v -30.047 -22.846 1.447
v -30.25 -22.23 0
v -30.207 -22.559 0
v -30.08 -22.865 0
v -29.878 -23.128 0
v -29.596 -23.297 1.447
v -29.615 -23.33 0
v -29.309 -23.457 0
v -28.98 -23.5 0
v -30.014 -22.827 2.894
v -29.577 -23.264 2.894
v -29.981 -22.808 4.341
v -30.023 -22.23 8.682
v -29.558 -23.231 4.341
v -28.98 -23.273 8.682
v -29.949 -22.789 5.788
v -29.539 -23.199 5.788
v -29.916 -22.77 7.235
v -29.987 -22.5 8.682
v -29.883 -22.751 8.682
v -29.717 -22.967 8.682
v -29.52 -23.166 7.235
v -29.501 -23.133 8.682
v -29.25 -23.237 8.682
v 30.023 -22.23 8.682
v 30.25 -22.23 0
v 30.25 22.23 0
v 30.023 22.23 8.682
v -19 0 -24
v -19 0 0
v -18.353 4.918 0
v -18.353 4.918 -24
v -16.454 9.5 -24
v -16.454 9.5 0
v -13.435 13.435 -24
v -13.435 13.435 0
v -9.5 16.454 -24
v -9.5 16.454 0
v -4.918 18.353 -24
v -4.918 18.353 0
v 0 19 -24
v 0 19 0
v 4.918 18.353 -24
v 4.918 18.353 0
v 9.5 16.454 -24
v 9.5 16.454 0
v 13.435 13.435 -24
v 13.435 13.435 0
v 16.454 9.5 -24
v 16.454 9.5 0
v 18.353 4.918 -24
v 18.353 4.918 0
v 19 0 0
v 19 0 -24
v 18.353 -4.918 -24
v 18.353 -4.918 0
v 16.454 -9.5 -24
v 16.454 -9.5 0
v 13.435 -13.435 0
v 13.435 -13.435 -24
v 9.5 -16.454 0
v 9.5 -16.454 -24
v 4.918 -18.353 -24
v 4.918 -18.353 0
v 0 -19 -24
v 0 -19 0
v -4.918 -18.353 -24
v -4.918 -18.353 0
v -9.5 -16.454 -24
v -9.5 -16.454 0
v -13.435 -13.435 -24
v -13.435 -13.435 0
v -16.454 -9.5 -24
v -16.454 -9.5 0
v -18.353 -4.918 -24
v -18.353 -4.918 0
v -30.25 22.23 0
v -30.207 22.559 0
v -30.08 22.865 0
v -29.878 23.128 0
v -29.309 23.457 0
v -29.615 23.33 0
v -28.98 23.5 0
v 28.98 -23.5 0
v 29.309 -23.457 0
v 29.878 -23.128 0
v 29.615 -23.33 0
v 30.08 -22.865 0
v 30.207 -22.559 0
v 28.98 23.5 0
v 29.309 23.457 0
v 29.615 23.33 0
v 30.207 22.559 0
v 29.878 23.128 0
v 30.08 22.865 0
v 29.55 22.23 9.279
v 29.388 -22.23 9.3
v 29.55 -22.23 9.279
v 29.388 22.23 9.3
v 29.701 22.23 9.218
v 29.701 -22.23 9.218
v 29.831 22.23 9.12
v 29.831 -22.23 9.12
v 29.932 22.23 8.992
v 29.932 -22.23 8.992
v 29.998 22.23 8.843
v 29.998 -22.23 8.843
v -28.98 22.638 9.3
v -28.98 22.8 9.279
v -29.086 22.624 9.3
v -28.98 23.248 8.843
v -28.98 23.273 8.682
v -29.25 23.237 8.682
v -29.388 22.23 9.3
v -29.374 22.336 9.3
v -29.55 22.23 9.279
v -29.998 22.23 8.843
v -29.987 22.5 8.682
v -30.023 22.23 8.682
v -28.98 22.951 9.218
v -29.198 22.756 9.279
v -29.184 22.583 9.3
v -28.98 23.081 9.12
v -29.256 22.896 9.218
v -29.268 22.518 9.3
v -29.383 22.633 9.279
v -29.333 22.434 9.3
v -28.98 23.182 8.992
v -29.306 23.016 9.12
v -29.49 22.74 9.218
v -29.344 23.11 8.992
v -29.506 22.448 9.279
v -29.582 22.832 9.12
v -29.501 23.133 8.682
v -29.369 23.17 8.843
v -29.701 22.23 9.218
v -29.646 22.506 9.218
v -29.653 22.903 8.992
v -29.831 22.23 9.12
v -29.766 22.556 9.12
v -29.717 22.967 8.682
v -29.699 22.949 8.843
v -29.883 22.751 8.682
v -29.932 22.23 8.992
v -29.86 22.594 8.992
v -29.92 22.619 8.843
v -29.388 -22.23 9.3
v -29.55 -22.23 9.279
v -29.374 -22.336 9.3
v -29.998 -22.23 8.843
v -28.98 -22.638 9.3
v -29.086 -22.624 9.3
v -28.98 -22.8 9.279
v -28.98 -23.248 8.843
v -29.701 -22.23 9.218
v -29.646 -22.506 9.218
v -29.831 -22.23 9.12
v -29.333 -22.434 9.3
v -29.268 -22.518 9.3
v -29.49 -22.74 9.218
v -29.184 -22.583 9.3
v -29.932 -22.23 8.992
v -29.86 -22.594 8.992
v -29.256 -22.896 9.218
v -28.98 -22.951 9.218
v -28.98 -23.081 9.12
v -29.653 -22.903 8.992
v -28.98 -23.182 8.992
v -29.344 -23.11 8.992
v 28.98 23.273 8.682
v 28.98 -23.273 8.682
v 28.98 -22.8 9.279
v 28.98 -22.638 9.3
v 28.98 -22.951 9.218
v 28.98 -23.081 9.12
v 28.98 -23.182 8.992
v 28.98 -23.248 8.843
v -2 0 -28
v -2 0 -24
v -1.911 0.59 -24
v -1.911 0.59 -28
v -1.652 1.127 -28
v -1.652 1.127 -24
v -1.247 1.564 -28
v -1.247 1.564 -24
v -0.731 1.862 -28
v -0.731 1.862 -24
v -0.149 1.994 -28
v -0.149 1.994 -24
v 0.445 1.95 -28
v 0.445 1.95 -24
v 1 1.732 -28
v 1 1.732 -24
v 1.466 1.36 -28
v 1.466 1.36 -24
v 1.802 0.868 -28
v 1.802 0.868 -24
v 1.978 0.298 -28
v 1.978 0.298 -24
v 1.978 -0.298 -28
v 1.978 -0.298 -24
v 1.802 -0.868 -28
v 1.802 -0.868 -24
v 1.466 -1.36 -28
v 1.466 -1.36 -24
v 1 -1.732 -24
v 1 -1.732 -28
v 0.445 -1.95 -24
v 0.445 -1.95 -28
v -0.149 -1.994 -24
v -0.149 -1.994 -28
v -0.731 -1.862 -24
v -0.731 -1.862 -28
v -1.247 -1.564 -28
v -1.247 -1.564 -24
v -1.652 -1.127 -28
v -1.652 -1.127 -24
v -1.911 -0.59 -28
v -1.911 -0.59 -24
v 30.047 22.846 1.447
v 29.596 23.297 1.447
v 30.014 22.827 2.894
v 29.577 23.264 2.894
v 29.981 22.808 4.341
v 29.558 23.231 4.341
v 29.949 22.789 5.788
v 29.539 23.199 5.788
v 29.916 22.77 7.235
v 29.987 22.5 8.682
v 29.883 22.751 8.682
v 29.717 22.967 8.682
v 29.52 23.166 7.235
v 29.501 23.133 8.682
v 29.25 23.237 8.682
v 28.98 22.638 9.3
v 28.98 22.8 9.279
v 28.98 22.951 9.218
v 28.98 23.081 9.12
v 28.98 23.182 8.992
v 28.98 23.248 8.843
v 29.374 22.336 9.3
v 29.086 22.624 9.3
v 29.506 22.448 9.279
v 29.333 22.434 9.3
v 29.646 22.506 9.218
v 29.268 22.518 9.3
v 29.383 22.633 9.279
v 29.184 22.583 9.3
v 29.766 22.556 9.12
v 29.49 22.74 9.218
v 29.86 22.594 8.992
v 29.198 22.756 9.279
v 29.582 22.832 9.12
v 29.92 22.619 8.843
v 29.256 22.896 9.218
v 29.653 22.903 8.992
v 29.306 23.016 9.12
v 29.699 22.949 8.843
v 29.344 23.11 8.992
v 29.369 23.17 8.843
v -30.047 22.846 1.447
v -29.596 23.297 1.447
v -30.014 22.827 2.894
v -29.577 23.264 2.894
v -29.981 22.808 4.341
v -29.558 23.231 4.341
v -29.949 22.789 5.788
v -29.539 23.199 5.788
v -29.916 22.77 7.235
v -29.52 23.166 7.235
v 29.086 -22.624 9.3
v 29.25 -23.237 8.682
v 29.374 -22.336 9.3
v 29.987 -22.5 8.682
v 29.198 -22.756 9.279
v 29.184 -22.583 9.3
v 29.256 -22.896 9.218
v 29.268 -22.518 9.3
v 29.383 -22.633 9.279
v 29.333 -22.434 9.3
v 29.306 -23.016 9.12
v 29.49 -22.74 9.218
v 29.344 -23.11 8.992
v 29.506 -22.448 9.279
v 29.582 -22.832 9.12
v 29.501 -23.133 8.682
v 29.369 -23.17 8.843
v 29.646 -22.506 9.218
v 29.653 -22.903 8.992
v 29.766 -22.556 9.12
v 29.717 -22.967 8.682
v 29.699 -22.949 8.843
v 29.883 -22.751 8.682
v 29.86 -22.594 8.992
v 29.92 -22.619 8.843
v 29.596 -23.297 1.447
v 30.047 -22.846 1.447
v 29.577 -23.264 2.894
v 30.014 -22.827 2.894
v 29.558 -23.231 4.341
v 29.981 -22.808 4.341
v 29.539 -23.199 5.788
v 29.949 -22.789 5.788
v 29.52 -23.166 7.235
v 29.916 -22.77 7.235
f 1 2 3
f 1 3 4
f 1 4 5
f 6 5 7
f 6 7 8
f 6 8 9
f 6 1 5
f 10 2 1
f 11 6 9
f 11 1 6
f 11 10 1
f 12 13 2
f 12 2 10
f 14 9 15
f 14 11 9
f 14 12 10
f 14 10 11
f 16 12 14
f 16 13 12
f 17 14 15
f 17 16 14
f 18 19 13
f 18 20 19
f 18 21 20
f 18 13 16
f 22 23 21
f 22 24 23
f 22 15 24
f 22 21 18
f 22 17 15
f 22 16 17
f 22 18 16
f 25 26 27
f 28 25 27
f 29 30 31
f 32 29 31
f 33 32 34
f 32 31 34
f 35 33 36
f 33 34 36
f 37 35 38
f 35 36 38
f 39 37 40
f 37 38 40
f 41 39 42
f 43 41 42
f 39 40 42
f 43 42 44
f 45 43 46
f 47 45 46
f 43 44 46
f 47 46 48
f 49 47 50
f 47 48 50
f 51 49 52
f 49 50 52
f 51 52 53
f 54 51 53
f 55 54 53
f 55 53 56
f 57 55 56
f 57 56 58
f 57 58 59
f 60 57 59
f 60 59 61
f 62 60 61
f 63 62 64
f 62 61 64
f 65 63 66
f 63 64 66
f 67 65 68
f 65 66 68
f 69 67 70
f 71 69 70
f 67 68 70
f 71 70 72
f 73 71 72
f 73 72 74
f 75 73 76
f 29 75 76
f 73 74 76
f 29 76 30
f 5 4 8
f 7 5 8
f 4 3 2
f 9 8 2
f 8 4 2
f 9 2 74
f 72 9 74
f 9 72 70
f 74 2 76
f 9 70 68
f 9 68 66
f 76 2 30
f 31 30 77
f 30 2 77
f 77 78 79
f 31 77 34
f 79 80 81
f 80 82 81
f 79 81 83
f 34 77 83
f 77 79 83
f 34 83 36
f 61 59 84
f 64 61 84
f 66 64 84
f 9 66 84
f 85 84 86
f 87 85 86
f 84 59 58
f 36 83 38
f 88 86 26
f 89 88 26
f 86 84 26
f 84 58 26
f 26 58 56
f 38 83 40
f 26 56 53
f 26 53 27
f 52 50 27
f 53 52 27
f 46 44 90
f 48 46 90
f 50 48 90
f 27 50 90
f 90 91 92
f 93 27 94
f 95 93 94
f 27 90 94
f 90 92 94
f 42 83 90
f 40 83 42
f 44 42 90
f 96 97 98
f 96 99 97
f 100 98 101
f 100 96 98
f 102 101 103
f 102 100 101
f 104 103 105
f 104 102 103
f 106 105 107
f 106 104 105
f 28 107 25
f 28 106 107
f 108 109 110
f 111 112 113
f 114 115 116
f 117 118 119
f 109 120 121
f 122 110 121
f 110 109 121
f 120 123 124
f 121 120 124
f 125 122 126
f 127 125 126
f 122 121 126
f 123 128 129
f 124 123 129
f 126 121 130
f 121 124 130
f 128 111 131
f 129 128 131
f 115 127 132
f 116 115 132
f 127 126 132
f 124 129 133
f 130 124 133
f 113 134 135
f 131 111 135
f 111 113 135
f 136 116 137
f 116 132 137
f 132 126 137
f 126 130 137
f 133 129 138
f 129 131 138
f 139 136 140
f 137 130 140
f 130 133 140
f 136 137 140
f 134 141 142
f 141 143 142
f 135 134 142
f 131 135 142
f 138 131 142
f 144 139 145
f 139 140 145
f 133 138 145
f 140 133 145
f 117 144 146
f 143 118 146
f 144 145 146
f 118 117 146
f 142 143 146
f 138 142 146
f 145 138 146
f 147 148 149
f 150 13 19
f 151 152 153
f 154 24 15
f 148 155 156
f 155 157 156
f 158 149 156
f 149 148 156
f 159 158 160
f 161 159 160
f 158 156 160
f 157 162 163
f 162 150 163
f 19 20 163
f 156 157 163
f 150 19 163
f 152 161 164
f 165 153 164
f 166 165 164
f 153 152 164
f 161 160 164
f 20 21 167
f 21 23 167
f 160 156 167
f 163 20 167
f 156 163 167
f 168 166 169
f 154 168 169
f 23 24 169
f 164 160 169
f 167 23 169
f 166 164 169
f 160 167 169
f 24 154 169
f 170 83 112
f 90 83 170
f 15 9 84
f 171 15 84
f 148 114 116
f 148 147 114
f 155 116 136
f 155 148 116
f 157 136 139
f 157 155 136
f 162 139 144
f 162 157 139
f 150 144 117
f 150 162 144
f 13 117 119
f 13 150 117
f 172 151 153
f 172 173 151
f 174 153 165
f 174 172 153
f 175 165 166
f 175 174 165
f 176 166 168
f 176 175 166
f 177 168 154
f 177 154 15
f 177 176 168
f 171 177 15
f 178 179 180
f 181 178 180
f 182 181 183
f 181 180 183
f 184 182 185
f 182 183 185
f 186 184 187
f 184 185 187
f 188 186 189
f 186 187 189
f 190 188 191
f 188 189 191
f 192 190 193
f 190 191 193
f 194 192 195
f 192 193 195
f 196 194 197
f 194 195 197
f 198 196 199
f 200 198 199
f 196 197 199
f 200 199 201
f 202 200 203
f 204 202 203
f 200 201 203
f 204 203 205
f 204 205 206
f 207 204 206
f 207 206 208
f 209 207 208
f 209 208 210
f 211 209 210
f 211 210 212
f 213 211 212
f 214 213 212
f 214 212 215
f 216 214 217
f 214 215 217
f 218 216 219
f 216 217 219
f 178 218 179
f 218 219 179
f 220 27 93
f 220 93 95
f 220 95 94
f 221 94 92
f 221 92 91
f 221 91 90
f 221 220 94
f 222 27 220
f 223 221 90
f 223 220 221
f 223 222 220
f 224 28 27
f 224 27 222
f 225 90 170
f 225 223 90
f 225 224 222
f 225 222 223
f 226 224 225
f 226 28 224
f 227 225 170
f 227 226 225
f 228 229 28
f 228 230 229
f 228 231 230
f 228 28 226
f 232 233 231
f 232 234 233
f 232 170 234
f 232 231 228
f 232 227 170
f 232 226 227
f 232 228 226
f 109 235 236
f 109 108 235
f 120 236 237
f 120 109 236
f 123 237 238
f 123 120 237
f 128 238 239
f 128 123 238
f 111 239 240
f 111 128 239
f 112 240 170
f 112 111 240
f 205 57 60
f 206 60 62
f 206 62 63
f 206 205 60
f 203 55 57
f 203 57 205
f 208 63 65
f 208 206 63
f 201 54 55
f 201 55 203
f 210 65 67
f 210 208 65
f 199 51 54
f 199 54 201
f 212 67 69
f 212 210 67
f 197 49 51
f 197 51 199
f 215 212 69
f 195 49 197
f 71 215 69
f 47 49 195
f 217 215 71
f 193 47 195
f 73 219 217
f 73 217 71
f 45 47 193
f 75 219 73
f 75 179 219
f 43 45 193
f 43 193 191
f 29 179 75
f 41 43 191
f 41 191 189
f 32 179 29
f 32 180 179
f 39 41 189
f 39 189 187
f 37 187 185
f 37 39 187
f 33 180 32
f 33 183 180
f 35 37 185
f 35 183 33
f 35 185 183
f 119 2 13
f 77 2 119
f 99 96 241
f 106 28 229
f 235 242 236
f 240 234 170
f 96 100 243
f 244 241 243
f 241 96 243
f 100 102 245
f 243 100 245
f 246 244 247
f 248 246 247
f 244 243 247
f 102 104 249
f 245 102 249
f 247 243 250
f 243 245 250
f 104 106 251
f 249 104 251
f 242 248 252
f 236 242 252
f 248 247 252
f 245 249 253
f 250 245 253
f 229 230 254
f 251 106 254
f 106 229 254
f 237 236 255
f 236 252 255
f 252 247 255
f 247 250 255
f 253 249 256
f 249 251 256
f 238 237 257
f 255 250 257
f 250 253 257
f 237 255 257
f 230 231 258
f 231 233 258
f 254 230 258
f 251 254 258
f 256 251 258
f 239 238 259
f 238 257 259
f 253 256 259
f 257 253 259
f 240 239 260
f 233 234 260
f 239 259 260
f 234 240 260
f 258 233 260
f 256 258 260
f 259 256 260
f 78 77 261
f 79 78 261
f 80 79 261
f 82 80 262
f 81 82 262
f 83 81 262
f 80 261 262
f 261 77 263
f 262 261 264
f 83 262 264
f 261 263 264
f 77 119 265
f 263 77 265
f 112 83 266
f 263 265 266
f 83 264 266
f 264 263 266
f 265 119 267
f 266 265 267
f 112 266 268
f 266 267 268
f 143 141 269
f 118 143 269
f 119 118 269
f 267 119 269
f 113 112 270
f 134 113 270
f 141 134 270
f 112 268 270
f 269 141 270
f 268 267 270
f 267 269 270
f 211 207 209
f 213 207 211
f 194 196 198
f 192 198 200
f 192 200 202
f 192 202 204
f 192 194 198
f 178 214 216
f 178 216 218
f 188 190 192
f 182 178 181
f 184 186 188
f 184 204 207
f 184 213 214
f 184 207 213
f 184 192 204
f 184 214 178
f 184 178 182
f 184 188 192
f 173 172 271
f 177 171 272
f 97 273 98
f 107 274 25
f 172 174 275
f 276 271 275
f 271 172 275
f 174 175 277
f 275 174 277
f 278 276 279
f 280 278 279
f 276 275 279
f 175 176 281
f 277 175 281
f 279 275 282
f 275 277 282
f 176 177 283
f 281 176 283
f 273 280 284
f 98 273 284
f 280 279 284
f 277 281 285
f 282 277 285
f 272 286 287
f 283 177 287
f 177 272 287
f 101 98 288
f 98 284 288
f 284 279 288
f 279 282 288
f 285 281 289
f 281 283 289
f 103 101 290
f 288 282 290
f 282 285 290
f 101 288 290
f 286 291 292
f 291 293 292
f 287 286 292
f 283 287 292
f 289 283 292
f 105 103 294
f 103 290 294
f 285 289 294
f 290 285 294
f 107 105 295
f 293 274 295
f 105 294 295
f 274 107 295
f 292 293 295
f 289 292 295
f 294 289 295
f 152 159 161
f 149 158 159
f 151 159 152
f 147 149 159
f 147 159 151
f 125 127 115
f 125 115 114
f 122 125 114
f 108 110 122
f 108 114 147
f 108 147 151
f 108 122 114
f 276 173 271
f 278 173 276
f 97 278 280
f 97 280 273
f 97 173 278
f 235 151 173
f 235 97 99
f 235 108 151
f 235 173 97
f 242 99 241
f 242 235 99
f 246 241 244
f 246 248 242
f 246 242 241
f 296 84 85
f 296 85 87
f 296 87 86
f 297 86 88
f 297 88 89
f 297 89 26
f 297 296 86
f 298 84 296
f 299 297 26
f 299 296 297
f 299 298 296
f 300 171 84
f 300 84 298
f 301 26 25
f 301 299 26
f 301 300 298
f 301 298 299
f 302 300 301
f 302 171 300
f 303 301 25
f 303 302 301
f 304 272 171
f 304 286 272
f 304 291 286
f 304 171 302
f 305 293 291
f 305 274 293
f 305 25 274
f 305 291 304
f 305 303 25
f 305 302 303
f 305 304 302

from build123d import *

# Parameters (mm, degrees)
SKETCH1_W           = 60.5
SKETCH1_H           = 47
BOSS_EXTRUDE1_DEPTH = 9.3
FILLET1_R           = 1.27
DRAFT1_ANGLE        = -1.5
FILLET2_R           = 0.635
SKETCH3_R           = 19
BOSS_EXTRUDE2_DEPTH = 24
SKETCH4_R           = 2
BOSS_EXTRUDE3_DEPTH = 4


with BuildPart() as part:
    # Sketch1 → Boss-Extrude1 (new body)
    with BuildSketch(Plane.XY):
        Rectangle(SKETCH1_W, SKETCH1_H)
    extrude(amount=BOSS_EXTRUDE1_DEPTH)

    # Fillet1
    fillet1_edges = [part.edges().sort_by_distance(p)[0] for p in [
        (30.25, -23.5, 4.65),
        (-30.25, -23.5, 4.65),
        (-30.25, 23.5, 4.65),
        (30.25, 23.5, 4.65),
    ]]
    fillet(fillet1_edges, radius=FILLET1_R)

    # Draft1
    draft1_faces = [part.faces().sort_by_distance(p)[0] for p in [
        (-29.878025612, -23.128025612, 4.65),
        (0, -23.5, 4.65),
        (29.878025612, -23.128025612, 4.65),
        (30.25, 0, 4.65),
        (29.878025612, 23.128025612, 4.65),
        (0, 23.5, 4.65),
        (-30.25, 0, 4.65),
        (-29.878025612, 23.128025612, 4.65),
    ]]
    draft(draft1_faces, Plane(origin=(0, 0, 0), x_dir=(-1, 0, 0), z_dir=(0, 0, -1)), DRAFT1_ANGLE)

    # Fillet2
    fillet2_edges = [part.edges().sort_by_distance(p)[0] for p in [
        (0, -23.256470929, 9.3),
        (-30.006470929, 0, 9.3),
        (30.006470929, 0, 9.3),
        (0, 23.256470929, 9.3),
        (-29.705824555, 22.955824555, 9.3),
        (29.705824555, 22.955824555, 9.3),
        (29.705824555, -22.955824555, 9.3),
        (-29.705824555, -22.955824555, 9.3),
    ]]
    fillet(fillet2_edges, radius=FILLET2_R)

    # Sketch3 → Boss-Extrude2 (add)
    with BuildSketch(Plane(origin=(0, 0, 0), x_dir=(-1, 0, 0), z_dir=(0, 0, -1))):
        Circle(SKETCH3_R)
    extrude(amount=BOSS_EXTRUDE2_DEPTH)

    # Sketch4 → Boss-Extrude3 (add)
    with BuildSketch(Plane(origin=(0, 0, -24), x_dir=(-1, 0, 0), z_dir=(0, 0, -1))):
        Circle(SKETCH4_R)
    extrude(amount=BOSS_EXTRUDE3_DEPTH)


solid = part.part
